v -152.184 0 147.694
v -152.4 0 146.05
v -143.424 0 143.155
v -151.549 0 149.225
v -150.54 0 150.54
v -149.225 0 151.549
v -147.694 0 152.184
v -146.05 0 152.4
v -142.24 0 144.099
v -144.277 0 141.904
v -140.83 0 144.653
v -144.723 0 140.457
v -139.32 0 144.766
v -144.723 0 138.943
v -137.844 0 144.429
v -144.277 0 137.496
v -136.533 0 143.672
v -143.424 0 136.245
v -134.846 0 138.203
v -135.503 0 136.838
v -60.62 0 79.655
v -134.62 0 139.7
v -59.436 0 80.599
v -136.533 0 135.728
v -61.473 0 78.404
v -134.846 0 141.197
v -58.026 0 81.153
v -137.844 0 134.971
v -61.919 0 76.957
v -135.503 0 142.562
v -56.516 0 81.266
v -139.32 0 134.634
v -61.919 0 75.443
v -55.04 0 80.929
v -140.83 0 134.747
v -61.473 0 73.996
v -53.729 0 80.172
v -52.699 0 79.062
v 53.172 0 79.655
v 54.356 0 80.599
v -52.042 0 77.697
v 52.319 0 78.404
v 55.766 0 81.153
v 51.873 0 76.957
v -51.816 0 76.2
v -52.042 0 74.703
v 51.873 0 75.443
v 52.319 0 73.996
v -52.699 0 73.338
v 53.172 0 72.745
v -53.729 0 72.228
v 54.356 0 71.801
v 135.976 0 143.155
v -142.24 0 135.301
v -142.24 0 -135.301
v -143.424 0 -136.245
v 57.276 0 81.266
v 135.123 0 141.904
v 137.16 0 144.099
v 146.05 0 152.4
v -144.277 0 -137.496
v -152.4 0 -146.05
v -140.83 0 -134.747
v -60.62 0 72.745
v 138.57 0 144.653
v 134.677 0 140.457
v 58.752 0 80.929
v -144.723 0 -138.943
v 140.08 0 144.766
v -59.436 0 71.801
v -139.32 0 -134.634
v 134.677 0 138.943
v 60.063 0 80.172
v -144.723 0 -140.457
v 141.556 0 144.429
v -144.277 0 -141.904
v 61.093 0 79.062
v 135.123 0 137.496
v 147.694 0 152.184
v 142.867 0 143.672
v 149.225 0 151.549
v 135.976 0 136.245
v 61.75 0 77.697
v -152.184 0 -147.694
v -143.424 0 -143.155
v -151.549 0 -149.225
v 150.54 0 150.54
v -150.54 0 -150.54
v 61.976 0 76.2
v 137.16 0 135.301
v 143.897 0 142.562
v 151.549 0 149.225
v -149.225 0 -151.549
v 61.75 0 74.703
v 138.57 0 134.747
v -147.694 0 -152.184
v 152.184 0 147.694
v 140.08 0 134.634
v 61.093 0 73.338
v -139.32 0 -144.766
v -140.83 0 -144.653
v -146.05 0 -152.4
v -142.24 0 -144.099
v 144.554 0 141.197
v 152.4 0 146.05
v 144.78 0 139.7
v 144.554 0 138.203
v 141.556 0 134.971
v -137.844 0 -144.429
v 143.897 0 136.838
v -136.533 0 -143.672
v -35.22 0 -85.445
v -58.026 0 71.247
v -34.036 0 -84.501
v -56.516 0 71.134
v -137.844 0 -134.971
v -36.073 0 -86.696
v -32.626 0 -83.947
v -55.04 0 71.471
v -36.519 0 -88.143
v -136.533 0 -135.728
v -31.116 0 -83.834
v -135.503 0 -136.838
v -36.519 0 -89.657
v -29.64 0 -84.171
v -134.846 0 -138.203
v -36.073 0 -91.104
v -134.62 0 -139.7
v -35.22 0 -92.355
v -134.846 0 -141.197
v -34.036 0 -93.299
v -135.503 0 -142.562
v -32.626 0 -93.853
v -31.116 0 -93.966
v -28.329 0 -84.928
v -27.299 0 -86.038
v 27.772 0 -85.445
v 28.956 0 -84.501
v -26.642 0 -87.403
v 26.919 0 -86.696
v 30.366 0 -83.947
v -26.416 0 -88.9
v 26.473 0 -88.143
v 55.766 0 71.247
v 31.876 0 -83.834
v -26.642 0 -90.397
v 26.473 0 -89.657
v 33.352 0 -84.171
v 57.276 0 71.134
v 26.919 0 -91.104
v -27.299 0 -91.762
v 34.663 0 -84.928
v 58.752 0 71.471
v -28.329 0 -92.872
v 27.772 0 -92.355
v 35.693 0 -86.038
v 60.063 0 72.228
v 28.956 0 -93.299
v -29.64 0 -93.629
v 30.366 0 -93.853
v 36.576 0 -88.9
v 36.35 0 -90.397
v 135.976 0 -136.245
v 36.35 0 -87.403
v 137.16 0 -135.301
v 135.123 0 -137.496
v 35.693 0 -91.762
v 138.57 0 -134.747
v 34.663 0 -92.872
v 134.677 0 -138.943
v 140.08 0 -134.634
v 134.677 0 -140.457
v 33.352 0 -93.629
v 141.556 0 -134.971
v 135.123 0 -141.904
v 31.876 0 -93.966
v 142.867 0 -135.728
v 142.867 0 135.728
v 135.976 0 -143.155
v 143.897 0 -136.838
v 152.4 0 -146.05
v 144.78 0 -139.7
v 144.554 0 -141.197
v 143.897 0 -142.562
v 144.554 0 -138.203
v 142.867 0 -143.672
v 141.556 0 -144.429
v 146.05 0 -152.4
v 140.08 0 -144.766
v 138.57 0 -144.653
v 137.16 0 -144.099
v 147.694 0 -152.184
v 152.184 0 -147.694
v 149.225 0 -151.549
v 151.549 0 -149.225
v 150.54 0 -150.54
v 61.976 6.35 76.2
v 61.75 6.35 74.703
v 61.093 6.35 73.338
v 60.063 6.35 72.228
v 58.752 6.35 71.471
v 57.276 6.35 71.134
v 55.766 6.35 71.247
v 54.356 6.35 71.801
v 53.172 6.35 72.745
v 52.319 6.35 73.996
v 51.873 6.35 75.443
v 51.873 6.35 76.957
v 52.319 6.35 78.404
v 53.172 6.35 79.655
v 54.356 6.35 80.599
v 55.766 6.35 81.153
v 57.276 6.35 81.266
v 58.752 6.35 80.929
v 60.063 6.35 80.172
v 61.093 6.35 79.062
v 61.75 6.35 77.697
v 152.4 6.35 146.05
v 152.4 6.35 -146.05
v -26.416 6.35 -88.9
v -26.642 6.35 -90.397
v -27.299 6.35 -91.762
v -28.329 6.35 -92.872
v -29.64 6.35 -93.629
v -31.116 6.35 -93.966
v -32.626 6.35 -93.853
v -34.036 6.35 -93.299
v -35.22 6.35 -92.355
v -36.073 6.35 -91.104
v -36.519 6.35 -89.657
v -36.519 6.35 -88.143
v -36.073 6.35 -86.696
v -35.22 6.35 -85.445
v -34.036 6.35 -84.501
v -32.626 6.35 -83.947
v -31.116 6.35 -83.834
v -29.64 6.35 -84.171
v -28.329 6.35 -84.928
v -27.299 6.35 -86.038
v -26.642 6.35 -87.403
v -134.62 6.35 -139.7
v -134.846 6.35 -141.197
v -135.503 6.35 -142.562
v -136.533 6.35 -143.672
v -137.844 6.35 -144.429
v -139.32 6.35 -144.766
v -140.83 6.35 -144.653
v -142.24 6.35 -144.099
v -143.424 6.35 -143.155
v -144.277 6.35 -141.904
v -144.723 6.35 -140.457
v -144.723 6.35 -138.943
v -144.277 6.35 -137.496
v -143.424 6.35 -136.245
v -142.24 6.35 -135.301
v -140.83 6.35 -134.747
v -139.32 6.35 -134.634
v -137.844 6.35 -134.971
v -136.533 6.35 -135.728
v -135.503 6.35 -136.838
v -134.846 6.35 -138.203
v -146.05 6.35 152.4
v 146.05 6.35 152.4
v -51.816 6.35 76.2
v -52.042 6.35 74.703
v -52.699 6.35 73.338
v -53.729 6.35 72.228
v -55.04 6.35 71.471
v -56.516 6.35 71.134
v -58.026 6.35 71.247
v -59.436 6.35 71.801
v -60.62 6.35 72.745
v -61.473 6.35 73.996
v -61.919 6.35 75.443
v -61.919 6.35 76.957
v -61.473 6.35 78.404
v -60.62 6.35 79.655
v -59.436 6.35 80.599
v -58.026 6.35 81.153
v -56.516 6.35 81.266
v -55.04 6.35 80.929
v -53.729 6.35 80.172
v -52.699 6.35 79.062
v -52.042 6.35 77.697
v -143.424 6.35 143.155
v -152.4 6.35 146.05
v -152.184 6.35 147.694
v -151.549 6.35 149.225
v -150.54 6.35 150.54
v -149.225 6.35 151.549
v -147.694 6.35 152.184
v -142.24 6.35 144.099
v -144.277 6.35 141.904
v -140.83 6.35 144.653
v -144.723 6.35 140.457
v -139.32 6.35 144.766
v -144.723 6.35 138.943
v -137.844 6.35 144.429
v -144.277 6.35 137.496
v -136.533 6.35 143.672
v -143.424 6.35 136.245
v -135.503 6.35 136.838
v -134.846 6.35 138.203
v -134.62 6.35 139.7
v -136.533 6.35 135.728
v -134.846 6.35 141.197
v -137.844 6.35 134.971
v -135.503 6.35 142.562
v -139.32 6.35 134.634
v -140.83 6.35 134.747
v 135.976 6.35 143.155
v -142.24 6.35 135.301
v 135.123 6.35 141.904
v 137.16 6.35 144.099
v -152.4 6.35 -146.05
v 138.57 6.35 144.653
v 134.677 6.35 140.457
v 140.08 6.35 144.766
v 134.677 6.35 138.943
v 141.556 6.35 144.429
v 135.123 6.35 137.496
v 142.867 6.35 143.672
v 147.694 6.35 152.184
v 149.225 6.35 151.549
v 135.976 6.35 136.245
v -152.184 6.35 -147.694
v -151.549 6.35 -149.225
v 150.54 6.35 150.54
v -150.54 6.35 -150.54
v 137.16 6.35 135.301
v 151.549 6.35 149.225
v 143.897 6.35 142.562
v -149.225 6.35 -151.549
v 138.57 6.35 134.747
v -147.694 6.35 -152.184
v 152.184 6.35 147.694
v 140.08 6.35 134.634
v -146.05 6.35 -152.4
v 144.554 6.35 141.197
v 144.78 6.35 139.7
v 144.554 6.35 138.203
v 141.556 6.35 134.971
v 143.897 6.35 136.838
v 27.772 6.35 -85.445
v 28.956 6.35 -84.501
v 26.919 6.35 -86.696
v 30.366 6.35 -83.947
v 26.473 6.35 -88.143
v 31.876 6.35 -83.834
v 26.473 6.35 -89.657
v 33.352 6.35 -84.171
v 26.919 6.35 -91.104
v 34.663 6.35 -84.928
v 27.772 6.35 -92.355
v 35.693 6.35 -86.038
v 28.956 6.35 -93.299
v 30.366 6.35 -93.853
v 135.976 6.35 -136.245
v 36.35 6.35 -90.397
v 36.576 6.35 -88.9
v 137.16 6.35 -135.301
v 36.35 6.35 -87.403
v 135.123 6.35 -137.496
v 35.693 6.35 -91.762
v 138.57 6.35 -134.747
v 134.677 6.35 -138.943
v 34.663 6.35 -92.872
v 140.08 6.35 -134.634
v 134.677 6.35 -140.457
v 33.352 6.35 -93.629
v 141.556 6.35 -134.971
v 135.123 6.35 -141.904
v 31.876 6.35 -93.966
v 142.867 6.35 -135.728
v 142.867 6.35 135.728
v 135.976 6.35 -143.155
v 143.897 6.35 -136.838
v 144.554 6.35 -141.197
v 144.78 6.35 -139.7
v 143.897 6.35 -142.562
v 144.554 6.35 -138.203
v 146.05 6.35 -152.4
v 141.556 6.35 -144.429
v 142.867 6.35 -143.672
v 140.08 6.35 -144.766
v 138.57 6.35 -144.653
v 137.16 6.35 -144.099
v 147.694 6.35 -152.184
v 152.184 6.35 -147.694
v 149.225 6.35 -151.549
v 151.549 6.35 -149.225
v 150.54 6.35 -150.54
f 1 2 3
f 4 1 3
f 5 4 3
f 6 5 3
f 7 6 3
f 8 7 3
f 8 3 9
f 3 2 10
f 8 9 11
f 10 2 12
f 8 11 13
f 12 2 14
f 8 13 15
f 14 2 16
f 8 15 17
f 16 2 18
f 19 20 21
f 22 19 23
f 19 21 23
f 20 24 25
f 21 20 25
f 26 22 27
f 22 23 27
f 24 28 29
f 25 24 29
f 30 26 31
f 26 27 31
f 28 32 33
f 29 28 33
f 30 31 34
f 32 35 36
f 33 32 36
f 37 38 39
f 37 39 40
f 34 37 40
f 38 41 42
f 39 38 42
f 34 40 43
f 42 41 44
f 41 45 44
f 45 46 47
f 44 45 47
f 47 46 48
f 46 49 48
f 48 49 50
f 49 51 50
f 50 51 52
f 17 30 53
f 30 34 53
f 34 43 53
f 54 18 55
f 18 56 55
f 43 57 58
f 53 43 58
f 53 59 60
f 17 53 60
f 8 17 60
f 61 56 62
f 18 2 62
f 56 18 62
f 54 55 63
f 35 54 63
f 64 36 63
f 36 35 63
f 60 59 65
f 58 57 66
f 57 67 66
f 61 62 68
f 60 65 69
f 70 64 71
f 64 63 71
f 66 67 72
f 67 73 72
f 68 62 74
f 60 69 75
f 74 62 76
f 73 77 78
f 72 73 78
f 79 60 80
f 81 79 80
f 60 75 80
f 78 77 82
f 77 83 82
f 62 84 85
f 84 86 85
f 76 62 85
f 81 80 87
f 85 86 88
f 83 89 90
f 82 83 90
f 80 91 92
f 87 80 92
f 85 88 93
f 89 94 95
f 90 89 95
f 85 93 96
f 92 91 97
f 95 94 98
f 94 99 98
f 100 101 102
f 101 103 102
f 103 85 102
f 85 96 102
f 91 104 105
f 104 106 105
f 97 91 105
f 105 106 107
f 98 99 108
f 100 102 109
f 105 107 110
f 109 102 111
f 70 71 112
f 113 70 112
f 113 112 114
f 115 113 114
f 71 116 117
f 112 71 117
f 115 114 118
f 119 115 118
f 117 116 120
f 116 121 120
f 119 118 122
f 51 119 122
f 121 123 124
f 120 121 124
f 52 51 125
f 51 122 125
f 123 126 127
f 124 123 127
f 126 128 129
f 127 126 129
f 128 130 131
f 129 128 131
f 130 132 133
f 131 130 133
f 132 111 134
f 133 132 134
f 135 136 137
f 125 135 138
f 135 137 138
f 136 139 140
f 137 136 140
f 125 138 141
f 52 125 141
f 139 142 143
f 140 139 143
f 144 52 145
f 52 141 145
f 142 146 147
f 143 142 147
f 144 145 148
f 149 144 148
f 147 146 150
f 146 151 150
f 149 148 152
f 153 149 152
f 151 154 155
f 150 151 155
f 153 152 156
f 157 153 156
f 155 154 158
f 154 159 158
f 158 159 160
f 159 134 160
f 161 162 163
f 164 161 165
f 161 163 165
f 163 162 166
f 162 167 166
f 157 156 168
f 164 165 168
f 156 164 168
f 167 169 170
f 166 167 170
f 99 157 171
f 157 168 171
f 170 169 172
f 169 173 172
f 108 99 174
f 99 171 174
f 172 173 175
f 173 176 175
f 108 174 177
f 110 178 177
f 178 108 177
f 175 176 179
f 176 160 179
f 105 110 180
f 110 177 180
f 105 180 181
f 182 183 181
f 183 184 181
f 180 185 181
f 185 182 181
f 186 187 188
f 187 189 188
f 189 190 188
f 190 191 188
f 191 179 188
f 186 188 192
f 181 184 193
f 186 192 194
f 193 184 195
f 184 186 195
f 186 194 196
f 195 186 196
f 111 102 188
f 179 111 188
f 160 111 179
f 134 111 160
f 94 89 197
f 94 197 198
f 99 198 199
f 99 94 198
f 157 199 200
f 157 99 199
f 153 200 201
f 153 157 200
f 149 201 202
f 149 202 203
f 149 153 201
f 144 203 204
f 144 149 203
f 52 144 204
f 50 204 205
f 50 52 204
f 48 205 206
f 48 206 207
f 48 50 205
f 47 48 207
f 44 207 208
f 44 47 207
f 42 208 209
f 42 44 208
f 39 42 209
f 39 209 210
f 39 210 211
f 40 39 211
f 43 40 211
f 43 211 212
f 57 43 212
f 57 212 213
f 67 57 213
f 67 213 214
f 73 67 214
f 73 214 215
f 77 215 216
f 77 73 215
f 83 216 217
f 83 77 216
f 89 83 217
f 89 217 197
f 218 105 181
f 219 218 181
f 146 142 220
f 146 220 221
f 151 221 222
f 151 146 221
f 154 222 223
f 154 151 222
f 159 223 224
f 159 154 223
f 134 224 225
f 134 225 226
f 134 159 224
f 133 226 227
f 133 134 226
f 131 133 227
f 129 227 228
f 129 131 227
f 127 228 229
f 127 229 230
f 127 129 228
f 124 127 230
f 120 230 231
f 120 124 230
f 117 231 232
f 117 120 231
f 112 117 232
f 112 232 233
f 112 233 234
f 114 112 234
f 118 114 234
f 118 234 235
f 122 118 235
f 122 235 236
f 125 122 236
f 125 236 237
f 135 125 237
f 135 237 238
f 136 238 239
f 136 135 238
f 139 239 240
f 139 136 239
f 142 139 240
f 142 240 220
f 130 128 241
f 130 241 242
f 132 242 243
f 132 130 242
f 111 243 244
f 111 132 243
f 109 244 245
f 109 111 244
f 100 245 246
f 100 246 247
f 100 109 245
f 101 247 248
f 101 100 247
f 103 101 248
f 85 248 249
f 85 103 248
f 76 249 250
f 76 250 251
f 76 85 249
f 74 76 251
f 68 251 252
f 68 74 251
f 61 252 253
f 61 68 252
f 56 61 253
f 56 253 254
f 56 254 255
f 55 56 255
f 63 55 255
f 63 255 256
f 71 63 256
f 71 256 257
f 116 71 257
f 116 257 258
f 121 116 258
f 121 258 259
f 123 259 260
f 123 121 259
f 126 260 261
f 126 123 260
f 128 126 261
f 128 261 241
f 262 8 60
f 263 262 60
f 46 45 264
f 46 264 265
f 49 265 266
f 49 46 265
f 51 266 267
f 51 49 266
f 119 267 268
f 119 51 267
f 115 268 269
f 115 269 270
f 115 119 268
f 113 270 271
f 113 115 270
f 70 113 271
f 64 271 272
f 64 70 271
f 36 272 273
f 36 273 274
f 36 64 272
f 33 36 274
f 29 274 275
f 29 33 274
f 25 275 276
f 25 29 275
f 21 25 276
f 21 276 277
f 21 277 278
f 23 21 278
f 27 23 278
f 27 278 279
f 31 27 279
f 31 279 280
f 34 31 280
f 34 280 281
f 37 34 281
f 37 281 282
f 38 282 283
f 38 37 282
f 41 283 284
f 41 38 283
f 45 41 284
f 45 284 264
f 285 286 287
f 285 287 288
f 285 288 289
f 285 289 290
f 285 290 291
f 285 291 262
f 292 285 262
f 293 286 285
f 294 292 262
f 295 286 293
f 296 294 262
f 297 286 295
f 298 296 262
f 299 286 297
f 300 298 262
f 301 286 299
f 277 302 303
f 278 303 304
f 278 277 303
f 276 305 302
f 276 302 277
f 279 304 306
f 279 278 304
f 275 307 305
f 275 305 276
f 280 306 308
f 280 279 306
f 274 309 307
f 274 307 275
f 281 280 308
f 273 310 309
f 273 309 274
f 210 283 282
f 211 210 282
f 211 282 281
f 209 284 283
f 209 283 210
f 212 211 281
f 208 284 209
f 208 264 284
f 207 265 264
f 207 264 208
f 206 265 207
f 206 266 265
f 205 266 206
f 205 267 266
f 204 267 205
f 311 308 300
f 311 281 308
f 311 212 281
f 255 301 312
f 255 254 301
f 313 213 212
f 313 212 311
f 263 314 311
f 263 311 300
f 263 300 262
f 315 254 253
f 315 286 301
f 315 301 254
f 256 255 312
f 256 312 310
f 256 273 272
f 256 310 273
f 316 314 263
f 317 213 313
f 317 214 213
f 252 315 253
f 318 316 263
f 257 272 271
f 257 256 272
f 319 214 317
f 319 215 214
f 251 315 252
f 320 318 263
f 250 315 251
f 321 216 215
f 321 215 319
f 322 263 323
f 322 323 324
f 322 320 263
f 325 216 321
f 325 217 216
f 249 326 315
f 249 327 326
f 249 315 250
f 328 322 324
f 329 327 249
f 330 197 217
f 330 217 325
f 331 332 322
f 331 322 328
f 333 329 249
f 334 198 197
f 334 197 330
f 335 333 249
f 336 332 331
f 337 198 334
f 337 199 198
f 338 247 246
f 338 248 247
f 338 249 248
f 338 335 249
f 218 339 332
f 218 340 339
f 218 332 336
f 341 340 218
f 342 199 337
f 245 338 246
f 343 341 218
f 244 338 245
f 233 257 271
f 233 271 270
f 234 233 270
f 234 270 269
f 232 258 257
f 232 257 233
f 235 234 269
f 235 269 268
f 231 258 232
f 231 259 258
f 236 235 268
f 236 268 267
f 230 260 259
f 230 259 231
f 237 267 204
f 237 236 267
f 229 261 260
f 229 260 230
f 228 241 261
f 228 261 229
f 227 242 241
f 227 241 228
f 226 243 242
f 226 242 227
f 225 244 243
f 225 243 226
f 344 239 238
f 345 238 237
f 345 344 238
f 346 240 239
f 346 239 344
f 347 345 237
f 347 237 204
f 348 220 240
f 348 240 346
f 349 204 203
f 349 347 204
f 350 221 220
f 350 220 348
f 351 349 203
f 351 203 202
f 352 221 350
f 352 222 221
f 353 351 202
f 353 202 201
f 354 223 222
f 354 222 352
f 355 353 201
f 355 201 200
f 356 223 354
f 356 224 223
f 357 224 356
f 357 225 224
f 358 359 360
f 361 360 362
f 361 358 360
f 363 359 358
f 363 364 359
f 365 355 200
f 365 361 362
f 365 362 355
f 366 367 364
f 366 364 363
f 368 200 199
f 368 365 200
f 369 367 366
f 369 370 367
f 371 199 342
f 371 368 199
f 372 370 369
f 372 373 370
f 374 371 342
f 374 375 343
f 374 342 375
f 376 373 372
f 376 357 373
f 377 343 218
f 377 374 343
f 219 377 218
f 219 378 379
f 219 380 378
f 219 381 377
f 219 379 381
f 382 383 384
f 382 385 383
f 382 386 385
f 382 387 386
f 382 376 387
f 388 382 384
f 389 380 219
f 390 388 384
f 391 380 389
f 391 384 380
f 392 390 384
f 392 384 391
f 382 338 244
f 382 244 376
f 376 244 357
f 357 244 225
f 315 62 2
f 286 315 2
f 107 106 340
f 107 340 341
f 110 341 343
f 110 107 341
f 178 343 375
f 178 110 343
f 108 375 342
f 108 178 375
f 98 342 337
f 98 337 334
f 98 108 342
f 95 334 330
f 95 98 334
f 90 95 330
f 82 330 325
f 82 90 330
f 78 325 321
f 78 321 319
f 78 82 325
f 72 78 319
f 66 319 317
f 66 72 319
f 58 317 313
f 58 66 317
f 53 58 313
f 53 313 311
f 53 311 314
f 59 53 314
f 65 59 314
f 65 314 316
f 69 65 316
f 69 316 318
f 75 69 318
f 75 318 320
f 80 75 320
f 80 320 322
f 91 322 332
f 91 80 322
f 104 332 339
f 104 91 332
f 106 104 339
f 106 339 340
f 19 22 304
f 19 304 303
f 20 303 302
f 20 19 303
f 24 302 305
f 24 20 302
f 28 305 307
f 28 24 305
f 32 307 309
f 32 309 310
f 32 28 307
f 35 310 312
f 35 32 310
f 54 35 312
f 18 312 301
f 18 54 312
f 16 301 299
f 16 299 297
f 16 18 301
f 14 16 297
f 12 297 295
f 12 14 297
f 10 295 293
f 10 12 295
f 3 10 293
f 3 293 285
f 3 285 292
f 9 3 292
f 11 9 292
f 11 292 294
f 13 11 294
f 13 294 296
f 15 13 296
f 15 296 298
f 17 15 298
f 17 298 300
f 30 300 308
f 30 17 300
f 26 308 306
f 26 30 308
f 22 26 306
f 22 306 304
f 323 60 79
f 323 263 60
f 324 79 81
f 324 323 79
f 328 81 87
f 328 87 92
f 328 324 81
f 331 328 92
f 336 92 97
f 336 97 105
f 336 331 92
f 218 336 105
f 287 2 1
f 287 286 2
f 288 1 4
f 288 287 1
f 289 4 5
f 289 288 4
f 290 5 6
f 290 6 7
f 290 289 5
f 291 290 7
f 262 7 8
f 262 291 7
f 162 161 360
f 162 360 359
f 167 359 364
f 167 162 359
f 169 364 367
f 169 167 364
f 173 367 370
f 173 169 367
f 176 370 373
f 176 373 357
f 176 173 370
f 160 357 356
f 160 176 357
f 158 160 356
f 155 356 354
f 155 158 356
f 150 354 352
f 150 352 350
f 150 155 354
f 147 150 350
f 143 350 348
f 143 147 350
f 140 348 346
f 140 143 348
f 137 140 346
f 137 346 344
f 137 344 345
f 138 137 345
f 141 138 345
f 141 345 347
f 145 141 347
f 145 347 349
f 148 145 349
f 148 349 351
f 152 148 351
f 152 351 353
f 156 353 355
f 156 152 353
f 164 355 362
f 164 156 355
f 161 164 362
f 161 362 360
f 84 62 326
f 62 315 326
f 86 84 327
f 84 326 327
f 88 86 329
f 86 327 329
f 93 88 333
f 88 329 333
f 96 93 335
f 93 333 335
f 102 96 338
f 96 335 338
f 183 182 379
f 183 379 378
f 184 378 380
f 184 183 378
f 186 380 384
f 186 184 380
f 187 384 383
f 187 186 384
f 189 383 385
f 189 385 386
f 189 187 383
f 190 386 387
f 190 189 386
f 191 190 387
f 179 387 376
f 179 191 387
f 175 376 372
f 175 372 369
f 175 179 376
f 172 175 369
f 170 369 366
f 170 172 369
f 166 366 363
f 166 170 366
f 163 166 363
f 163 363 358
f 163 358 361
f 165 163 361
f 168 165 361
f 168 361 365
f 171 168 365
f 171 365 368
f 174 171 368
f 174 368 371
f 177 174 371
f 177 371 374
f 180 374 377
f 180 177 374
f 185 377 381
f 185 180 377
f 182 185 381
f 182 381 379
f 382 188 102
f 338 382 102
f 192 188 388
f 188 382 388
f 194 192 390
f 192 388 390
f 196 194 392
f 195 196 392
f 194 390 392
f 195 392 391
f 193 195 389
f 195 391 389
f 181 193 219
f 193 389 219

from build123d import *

# Parameters (mm, degrees)
SKETCH2_R           = 5.08
BOSS_EXTRUDE1_DEPTH = 6.35
FILLET1_R           = 6.35
FILLET2_R           = 6.35


with BuildPart() as part:
    # Sketch2 → Boss-Extrude1 (new body)
    with BuildSketch(Plane(origin=(0, 0, 0), x_dir=(1, 0, 0), z_dir=(0, 1, 0))):
        Polygon((-152.4, 152.4), (-152.4, -152.4), (152.4, -152.4), (152.4, 142.494), (152.4, 152.4), (142.494, 152.4), align=None)
        with Locations((-139.7, -139.7)):
            Circle(SKETCH2_R, mode=Mode.SUBTRACT)
        with Locations((-56.896, -76.2)):
            Circle(SKETCH2_R, mode=Mode.SUBTRACT)
        with Locations((139.7, -139.7)):
            Circle(SKETCH2_R, mode=Mode.SUBTRACT)
        with Locations((56.896, -76.2)):
            Circle(SKETCH2_R, mode=Mode.SUBTRACT)
        with Locations((-139.7, 139.7)):
            Circle(SKETCH2_R, mode=Mode.SUBTRACT)
        with Locations((-31.496, 88.9)):
            Circle(SKETCH2_R, mode=Mode.SUBTRACT)
        with Locations((31.496, 88.9)):
            Circle(SKETCH2_R, mode=Mode.SUBTRACT)
        with Locations((139.7, 139.7)):
            Circle(SKETCH2_R, mode=Mode.SUBTRACT)
    extrude(amount=BOSS_EXTRUDE1_DEPTH)

    # Fillet1
    fillet1_edges = [part.edges().sort_by_distance(p)[0] for p in [
        (-152.4, 3.175, 152.4),
    ]]
    fillet(fillet1_edges, radius=FILLET1_R)

    # Fillet2
    fillet2_edges = [part.edges().sort_by_distance(p)[0] for p in [
        (-152.4, 3.175, -152.4),
        (152.4, 3.175, -152.4),
        (152.4, 3.175, 152.4),
    ]]
    fillet(fillet2_edges, radius=FILLET2_R)


solid = part.part
